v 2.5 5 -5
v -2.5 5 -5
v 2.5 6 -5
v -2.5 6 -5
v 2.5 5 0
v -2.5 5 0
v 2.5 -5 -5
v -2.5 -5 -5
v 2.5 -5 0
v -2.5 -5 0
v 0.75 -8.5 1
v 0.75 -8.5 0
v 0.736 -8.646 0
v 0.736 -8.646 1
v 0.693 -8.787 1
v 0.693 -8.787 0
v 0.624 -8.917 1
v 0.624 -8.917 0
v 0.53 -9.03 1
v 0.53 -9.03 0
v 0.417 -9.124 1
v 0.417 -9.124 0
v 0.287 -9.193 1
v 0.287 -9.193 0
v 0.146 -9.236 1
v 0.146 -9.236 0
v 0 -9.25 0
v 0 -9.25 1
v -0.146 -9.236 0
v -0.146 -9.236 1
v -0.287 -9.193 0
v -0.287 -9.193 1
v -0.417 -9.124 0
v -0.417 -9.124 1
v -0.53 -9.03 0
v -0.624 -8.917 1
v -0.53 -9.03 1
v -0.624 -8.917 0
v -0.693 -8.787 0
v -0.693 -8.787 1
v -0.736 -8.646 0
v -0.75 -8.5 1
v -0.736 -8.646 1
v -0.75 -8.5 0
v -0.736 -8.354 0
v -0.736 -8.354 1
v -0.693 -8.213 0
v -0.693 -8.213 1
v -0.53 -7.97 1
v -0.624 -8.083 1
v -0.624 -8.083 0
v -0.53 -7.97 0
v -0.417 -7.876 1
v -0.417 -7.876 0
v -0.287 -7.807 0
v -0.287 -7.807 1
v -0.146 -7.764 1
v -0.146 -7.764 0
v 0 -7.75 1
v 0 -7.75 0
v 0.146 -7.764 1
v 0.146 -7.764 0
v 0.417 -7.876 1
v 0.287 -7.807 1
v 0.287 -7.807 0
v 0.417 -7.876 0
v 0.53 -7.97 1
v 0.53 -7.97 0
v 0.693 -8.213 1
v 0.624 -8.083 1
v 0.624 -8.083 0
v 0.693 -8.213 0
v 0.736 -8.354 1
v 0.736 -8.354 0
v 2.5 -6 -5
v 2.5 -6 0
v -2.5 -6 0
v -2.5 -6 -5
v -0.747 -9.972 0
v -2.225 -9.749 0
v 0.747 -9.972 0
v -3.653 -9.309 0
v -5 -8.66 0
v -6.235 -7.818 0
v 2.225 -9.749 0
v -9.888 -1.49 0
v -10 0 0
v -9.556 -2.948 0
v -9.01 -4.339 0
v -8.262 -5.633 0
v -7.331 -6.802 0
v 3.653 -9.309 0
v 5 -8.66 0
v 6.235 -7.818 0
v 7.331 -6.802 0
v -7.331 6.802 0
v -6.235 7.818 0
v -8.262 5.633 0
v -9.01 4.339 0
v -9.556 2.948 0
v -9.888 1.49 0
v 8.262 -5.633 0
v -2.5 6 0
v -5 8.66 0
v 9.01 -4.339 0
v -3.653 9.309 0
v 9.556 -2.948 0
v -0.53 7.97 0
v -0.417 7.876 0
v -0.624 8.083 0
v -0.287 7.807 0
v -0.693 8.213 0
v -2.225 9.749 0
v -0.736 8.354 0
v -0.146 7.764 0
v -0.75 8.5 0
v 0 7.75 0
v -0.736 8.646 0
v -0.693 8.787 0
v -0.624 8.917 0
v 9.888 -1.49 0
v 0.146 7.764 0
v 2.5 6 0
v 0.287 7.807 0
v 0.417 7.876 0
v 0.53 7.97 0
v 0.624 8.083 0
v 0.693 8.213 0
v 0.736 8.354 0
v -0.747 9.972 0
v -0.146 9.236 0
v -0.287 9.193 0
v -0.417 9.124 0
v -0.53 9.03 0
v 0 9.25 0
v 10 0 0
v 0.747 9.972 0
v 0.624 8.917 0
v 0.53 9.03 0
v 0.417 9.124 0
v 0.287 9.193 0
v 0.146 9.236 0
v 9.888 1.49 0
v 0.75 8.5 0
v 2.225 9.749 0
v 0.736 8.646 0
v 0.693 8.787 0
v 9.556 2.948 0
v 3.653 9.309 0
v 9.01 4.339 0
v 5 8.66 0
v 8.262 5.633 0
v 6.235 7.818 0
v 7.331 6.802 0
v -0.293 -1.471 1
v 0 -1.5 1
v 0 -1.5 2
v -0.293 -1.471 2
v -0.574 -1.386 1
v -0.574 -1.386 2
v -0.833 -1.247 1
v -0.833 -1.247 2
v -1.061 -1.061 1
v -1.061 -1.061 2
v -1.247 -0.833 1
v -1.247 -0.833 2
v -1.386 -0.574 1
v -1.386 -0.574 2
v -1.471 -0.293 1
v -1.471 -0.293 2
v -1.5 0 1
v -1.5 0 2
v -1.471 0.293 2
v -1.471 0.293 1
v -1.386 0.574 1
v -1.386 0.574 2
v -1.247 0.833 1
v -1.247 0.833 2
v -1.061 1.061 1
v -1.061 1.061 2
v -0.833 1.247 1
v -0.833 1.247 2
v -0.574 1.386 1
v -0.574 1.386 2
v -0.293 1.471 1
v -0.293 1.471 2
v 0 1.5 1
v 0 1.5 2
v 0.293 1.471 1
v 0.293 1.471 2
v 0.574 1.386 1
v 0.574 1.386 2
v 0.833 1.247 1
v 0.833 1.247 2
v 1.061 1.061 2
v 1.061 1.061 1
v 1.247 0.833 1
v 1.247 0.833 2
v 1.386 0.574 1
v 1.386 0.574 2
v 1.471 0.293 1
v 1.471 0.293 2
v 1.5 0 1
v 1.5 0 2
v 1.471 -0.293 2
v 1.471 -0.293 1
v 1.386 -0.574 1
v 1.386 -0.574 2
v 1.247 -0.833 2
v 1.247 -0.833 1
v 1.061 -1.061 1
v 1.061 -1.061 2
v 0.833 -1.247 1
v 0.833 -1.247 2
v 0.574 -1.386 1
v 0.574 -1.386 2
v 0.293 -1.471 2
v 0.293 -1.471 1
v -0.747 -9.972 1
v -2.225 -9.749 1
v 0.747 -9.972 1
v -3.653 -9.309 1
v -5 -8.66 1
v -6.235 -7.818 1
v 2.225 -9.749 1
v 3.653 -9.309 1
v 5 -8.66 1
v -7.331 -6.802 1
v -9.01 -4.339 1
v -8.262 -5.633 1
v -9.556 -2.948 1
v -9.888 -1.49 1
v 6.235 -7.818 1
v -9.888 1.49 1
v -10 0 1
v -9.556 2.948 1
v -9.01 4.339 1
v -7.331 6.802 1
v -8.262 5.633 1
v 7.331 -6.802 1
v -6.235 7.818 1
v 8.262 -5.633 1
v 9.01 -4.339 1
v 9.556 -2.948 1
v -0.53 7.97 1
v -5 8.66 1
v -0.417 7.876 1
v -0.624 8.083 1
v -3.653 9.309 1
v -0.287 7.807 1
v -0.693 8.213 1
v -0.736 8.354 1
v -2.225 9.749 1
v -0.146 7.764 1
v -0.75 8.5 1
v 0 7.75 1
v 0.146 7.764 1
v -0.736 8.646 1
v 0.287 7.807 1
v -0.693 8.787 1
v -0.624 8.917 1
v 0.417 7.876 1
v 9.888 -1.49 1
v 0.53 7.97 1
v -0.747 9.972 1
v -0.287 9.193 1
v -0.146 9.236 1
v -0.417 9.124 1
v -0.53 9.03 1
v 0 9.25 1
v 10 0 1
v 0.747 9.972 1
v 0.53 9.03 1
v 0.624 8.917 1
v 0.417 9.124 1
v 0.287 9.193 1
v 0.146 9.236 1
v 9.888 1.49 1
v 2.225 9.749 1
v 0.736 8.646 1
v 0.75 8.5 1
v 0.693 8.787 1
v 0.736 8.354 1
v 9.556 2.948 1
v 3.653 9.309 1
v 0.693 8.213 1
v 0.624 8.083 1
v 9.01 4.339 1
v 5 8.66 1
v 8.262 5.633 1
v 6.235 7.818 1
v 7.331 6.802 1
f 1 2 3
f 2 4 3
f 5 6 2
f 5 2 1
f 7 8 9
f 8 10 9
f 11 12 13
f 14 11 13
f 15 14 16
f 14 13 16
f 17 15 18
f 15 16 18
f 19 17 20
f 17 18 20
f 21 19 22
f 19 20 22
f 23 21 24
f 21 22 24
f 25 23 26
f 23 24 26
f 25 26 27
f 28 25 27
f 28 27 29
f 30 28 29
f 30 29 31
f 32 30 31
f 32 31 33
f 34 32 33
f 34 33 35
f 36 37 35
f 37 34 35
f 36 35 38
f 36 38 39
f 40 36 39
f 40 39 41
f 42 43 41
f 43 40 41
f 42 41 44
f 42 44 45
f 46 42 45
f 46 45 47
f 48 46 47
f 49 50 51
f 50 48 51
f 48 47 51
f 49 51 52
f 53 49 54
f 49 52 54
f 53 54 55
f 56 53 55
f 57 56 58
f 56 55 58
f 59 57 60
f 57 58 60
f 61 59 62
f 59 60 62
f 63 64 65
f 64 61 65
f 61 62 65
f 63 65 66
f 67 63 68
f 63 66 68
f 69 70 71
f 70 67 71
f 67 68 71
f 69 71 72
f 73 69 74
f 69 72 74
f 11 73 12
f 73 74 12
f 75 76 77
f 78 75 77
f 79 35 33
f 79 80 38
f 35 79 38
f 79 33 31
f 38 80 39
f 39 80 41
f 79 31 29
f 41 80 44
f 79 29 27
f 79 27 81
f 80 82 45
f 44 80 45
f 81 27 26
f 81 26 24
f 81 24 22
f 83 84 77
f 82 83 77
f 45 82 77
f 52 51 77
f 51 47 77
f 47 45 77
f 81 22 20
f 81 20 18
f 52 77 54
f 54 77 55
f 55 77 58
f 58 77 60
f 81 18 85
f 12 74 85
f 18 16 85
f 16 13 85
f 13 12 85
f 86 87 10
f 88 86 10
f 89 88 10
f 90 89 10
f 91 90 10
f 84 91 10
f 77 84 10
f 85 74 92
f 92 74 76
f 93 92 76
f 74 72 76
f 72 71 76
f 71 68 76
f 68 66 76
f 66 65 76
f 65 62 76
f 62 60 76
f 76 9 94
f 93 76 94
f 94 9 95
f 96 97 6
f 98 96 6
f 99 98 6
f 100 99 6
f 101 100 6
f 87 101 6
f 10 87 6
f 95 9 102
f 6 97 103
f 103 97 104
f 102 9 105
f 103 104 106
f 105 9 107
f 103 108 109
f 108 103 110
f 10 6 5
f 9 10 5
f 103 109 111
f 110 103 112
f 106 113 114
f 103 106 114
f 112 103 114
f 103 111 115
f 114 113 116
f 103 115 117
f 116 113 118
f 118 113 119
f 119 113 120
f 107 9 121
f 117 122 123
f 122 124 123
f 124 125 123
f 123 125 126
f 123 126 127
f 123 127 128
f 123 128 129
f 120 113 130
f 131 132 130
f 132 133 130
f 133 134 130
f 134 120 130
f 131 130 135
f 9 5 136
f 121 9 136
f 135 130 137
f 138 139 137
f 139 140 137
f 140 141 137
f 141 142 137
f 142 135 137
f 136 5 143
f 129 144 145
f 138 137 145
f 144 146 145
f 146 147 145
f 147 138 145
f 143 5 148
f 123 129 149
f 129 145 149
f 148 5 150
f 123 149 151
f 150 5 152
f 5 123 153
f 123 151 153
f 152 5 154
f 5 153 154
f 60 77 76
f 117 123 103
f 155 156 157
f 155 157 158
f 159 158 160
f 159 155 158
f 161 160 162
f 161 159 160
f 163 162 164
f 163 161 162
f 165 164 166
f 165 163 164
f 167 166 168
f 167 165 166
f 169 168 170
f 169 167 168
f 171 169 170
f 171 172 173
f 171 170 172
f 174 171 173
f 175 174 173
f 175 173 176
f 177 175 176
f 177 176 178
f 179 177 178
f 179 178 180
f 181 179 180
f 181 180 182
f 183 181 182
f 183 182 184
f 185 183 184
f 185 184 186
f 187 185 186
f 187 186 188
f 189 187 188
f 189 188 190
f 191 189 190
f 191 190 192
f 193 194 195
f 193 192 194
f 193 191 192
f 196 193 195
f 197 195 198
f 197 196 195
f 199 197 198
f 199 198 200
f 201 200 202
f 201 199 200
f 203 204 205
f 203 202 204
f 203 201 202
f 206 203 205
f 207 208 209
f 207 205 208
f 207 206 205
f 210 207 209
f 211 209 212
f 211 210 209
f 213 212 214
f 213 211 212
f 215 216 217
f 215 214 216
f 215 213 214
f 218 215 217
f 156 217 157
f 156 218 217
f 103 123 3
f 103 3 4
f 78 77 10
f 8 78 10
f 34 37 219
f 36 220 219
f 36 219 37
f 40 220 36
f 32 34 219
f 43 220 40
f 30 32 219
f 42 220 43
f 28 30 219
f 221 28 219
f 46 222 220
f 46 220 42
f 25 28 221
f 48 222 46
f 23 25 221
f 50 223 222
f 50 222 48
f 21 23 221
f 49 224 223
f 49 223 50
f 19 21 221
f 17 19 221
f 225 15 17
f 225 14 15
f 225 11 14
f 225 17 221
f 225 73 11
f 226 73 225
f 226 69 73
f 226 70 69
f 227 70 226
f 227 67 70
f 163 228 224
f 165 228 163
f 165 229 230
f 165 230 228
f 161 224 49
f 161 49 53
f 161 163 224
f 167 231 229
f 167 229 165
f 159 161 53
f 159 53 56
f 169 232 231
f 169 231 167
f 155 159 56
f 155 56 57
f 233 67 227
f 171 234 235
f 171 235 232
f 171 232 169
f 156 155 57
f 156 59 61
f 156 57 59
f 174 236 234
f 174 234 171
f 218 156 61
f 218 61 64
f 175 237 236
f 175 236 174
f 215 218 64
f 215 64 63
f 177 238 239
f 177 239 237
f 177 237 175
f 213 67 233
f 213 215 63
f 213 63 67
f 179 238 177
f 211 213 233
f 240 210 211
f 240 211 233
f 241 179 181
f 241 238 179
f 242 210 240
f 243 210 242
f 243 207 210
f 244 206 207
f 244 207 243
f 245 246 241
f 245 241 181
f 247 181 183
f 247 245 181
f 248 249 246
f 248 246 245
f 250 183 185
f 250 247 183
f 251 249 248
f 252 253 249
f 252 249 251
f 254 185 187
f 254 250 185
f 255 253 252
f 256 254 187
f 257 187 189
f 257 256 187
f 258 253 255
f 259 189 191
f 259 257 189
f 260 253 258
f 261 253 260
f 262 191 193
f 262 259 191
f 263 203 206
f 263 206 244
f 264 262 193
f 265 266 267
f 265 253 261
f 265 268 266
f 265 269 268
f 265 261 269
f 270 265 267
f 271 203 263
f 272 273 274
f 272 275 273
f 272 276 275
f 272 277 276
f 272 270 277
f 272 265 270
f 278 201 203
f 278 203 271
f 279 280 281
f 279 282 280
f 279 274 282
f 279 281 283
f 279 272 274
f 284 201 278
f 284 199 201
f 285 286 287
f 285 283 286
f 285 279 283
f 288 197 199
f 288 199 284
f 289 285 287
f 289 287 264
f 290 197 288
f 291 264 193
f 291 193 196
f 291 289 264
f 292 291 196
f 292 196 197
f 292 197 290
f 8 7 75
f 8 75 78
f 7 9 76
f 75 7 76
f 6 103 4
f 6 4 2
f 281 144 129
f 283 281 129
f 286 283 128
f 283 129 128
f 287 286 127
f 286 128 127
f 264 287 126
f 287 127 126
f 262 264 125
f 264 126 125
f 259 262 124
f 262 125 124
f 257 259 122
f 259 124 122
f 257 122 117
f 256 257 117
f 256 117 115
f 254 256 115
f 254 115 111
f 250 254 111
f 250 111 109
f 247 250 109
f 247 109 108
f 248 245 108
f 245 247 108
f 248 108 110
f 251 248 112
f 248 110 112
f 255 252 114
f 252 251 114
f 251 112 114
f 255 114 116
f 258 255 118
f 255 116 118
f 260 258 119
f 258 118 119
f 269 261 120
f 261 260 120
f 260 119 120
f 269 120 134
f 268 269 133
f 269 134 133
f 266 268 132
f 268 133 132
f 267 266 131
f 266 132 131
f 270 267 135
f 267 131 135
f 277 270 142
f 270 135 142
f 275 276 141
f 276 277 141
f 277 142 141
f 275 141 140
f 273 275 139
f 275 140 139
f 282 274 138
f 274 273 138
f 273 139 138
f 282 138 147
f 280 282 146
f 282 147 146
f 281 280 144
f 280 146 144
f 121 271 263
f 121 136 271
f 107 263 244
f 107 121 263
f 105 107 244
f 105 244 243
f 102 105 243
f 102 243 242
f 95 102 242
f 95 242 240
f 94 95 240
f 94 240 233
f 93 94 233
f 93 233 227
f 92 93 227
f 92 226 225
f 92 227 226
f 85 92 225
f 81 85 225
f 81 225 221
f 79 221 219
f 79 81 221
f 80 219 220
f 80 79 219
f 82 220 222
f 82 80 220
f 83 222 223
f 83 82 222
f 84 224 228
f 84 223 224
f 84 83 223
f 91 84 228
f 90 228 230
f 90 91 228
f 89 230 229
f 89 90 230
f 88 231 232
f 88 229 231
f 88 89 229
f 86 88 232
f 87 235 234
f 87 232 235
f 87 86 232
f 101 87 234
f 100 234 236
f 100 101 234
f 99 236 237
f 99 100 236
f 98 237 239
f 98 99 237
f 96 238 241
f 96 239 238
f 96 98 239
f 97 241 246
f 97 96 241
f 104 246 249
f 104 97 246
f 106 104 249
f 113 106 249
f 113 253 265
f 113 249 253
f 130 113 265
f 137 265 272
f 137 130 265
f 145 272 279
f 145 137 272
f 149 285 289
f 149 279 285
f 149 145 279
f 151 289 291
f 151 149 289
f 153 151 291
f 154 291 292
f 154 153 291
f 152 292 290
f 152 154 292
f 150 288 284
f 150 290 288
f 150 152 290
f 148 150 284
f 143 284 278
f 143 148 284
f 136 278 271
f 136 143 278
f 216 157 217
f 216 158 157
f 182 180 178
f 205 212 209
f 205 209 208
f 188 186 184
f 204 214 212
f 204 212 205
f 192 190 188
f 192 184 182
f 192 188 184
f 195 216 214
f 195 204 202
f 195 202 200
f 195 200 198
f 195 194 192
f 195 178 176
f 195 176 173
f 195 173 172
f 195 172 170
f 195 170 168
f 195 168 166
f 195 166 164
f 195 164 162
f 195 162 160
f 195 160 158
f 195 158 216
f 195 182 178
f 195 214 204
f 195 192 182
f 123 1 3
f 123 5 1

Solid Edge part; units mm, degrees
sketch "Sketch1" plane through (0, 0, 0) normal (0, 0, 1) x (1, 0, 0)
  circle A0 centre (0, 0) radius 10
  circle A1 centre (0, 8.5) radius 0.75
  circle A2 centre (0, -8.5) radius 0.75
  dimension "D1" = 20
  dimension "D2" = 1.5
  dimension "D3" = 8.5
extrude "Protrusion1" add sketch "Sketch1" along normal blind 1
sketch "Sketch2" plane through (0, 0, 0) normal (0, 0, -1) x (1, 0, 0)
  line L0 (-2.5, 5) -> (2.5, 5)
  line L1 (2.5, 5) -> (2.5, 6)
  line L2 (2.5, 6) -> (-2.5, 6)
  line L3 (-2.5, 6) -> (-2.5, 5)
  line L4 (-2.5, -5) -> (2.5, -5)
  line L5 (2.5, -5) -> (2.5, -6)
  line L6 (2.5, -6) -> (-2.5, -6)
  line L7 (-2.5, -6) -> (-2.5, -5)
  dimension "D1" = 5
  dimension "D2" = 1
  dimension "D3" = 5
extrude "ExtrudedProtrusion_3" add sketch "Sketch2" along normal blind 5
sketch "Sketch3" plane through (0, 0, 1) normal (0, 0, 1) x (0, -1, 0)
  circle A0 centre (0, 0) radius 1.5
extrude "ExtrudedProtrusion_4" add sketch "Sketch3" along normal blind 1
